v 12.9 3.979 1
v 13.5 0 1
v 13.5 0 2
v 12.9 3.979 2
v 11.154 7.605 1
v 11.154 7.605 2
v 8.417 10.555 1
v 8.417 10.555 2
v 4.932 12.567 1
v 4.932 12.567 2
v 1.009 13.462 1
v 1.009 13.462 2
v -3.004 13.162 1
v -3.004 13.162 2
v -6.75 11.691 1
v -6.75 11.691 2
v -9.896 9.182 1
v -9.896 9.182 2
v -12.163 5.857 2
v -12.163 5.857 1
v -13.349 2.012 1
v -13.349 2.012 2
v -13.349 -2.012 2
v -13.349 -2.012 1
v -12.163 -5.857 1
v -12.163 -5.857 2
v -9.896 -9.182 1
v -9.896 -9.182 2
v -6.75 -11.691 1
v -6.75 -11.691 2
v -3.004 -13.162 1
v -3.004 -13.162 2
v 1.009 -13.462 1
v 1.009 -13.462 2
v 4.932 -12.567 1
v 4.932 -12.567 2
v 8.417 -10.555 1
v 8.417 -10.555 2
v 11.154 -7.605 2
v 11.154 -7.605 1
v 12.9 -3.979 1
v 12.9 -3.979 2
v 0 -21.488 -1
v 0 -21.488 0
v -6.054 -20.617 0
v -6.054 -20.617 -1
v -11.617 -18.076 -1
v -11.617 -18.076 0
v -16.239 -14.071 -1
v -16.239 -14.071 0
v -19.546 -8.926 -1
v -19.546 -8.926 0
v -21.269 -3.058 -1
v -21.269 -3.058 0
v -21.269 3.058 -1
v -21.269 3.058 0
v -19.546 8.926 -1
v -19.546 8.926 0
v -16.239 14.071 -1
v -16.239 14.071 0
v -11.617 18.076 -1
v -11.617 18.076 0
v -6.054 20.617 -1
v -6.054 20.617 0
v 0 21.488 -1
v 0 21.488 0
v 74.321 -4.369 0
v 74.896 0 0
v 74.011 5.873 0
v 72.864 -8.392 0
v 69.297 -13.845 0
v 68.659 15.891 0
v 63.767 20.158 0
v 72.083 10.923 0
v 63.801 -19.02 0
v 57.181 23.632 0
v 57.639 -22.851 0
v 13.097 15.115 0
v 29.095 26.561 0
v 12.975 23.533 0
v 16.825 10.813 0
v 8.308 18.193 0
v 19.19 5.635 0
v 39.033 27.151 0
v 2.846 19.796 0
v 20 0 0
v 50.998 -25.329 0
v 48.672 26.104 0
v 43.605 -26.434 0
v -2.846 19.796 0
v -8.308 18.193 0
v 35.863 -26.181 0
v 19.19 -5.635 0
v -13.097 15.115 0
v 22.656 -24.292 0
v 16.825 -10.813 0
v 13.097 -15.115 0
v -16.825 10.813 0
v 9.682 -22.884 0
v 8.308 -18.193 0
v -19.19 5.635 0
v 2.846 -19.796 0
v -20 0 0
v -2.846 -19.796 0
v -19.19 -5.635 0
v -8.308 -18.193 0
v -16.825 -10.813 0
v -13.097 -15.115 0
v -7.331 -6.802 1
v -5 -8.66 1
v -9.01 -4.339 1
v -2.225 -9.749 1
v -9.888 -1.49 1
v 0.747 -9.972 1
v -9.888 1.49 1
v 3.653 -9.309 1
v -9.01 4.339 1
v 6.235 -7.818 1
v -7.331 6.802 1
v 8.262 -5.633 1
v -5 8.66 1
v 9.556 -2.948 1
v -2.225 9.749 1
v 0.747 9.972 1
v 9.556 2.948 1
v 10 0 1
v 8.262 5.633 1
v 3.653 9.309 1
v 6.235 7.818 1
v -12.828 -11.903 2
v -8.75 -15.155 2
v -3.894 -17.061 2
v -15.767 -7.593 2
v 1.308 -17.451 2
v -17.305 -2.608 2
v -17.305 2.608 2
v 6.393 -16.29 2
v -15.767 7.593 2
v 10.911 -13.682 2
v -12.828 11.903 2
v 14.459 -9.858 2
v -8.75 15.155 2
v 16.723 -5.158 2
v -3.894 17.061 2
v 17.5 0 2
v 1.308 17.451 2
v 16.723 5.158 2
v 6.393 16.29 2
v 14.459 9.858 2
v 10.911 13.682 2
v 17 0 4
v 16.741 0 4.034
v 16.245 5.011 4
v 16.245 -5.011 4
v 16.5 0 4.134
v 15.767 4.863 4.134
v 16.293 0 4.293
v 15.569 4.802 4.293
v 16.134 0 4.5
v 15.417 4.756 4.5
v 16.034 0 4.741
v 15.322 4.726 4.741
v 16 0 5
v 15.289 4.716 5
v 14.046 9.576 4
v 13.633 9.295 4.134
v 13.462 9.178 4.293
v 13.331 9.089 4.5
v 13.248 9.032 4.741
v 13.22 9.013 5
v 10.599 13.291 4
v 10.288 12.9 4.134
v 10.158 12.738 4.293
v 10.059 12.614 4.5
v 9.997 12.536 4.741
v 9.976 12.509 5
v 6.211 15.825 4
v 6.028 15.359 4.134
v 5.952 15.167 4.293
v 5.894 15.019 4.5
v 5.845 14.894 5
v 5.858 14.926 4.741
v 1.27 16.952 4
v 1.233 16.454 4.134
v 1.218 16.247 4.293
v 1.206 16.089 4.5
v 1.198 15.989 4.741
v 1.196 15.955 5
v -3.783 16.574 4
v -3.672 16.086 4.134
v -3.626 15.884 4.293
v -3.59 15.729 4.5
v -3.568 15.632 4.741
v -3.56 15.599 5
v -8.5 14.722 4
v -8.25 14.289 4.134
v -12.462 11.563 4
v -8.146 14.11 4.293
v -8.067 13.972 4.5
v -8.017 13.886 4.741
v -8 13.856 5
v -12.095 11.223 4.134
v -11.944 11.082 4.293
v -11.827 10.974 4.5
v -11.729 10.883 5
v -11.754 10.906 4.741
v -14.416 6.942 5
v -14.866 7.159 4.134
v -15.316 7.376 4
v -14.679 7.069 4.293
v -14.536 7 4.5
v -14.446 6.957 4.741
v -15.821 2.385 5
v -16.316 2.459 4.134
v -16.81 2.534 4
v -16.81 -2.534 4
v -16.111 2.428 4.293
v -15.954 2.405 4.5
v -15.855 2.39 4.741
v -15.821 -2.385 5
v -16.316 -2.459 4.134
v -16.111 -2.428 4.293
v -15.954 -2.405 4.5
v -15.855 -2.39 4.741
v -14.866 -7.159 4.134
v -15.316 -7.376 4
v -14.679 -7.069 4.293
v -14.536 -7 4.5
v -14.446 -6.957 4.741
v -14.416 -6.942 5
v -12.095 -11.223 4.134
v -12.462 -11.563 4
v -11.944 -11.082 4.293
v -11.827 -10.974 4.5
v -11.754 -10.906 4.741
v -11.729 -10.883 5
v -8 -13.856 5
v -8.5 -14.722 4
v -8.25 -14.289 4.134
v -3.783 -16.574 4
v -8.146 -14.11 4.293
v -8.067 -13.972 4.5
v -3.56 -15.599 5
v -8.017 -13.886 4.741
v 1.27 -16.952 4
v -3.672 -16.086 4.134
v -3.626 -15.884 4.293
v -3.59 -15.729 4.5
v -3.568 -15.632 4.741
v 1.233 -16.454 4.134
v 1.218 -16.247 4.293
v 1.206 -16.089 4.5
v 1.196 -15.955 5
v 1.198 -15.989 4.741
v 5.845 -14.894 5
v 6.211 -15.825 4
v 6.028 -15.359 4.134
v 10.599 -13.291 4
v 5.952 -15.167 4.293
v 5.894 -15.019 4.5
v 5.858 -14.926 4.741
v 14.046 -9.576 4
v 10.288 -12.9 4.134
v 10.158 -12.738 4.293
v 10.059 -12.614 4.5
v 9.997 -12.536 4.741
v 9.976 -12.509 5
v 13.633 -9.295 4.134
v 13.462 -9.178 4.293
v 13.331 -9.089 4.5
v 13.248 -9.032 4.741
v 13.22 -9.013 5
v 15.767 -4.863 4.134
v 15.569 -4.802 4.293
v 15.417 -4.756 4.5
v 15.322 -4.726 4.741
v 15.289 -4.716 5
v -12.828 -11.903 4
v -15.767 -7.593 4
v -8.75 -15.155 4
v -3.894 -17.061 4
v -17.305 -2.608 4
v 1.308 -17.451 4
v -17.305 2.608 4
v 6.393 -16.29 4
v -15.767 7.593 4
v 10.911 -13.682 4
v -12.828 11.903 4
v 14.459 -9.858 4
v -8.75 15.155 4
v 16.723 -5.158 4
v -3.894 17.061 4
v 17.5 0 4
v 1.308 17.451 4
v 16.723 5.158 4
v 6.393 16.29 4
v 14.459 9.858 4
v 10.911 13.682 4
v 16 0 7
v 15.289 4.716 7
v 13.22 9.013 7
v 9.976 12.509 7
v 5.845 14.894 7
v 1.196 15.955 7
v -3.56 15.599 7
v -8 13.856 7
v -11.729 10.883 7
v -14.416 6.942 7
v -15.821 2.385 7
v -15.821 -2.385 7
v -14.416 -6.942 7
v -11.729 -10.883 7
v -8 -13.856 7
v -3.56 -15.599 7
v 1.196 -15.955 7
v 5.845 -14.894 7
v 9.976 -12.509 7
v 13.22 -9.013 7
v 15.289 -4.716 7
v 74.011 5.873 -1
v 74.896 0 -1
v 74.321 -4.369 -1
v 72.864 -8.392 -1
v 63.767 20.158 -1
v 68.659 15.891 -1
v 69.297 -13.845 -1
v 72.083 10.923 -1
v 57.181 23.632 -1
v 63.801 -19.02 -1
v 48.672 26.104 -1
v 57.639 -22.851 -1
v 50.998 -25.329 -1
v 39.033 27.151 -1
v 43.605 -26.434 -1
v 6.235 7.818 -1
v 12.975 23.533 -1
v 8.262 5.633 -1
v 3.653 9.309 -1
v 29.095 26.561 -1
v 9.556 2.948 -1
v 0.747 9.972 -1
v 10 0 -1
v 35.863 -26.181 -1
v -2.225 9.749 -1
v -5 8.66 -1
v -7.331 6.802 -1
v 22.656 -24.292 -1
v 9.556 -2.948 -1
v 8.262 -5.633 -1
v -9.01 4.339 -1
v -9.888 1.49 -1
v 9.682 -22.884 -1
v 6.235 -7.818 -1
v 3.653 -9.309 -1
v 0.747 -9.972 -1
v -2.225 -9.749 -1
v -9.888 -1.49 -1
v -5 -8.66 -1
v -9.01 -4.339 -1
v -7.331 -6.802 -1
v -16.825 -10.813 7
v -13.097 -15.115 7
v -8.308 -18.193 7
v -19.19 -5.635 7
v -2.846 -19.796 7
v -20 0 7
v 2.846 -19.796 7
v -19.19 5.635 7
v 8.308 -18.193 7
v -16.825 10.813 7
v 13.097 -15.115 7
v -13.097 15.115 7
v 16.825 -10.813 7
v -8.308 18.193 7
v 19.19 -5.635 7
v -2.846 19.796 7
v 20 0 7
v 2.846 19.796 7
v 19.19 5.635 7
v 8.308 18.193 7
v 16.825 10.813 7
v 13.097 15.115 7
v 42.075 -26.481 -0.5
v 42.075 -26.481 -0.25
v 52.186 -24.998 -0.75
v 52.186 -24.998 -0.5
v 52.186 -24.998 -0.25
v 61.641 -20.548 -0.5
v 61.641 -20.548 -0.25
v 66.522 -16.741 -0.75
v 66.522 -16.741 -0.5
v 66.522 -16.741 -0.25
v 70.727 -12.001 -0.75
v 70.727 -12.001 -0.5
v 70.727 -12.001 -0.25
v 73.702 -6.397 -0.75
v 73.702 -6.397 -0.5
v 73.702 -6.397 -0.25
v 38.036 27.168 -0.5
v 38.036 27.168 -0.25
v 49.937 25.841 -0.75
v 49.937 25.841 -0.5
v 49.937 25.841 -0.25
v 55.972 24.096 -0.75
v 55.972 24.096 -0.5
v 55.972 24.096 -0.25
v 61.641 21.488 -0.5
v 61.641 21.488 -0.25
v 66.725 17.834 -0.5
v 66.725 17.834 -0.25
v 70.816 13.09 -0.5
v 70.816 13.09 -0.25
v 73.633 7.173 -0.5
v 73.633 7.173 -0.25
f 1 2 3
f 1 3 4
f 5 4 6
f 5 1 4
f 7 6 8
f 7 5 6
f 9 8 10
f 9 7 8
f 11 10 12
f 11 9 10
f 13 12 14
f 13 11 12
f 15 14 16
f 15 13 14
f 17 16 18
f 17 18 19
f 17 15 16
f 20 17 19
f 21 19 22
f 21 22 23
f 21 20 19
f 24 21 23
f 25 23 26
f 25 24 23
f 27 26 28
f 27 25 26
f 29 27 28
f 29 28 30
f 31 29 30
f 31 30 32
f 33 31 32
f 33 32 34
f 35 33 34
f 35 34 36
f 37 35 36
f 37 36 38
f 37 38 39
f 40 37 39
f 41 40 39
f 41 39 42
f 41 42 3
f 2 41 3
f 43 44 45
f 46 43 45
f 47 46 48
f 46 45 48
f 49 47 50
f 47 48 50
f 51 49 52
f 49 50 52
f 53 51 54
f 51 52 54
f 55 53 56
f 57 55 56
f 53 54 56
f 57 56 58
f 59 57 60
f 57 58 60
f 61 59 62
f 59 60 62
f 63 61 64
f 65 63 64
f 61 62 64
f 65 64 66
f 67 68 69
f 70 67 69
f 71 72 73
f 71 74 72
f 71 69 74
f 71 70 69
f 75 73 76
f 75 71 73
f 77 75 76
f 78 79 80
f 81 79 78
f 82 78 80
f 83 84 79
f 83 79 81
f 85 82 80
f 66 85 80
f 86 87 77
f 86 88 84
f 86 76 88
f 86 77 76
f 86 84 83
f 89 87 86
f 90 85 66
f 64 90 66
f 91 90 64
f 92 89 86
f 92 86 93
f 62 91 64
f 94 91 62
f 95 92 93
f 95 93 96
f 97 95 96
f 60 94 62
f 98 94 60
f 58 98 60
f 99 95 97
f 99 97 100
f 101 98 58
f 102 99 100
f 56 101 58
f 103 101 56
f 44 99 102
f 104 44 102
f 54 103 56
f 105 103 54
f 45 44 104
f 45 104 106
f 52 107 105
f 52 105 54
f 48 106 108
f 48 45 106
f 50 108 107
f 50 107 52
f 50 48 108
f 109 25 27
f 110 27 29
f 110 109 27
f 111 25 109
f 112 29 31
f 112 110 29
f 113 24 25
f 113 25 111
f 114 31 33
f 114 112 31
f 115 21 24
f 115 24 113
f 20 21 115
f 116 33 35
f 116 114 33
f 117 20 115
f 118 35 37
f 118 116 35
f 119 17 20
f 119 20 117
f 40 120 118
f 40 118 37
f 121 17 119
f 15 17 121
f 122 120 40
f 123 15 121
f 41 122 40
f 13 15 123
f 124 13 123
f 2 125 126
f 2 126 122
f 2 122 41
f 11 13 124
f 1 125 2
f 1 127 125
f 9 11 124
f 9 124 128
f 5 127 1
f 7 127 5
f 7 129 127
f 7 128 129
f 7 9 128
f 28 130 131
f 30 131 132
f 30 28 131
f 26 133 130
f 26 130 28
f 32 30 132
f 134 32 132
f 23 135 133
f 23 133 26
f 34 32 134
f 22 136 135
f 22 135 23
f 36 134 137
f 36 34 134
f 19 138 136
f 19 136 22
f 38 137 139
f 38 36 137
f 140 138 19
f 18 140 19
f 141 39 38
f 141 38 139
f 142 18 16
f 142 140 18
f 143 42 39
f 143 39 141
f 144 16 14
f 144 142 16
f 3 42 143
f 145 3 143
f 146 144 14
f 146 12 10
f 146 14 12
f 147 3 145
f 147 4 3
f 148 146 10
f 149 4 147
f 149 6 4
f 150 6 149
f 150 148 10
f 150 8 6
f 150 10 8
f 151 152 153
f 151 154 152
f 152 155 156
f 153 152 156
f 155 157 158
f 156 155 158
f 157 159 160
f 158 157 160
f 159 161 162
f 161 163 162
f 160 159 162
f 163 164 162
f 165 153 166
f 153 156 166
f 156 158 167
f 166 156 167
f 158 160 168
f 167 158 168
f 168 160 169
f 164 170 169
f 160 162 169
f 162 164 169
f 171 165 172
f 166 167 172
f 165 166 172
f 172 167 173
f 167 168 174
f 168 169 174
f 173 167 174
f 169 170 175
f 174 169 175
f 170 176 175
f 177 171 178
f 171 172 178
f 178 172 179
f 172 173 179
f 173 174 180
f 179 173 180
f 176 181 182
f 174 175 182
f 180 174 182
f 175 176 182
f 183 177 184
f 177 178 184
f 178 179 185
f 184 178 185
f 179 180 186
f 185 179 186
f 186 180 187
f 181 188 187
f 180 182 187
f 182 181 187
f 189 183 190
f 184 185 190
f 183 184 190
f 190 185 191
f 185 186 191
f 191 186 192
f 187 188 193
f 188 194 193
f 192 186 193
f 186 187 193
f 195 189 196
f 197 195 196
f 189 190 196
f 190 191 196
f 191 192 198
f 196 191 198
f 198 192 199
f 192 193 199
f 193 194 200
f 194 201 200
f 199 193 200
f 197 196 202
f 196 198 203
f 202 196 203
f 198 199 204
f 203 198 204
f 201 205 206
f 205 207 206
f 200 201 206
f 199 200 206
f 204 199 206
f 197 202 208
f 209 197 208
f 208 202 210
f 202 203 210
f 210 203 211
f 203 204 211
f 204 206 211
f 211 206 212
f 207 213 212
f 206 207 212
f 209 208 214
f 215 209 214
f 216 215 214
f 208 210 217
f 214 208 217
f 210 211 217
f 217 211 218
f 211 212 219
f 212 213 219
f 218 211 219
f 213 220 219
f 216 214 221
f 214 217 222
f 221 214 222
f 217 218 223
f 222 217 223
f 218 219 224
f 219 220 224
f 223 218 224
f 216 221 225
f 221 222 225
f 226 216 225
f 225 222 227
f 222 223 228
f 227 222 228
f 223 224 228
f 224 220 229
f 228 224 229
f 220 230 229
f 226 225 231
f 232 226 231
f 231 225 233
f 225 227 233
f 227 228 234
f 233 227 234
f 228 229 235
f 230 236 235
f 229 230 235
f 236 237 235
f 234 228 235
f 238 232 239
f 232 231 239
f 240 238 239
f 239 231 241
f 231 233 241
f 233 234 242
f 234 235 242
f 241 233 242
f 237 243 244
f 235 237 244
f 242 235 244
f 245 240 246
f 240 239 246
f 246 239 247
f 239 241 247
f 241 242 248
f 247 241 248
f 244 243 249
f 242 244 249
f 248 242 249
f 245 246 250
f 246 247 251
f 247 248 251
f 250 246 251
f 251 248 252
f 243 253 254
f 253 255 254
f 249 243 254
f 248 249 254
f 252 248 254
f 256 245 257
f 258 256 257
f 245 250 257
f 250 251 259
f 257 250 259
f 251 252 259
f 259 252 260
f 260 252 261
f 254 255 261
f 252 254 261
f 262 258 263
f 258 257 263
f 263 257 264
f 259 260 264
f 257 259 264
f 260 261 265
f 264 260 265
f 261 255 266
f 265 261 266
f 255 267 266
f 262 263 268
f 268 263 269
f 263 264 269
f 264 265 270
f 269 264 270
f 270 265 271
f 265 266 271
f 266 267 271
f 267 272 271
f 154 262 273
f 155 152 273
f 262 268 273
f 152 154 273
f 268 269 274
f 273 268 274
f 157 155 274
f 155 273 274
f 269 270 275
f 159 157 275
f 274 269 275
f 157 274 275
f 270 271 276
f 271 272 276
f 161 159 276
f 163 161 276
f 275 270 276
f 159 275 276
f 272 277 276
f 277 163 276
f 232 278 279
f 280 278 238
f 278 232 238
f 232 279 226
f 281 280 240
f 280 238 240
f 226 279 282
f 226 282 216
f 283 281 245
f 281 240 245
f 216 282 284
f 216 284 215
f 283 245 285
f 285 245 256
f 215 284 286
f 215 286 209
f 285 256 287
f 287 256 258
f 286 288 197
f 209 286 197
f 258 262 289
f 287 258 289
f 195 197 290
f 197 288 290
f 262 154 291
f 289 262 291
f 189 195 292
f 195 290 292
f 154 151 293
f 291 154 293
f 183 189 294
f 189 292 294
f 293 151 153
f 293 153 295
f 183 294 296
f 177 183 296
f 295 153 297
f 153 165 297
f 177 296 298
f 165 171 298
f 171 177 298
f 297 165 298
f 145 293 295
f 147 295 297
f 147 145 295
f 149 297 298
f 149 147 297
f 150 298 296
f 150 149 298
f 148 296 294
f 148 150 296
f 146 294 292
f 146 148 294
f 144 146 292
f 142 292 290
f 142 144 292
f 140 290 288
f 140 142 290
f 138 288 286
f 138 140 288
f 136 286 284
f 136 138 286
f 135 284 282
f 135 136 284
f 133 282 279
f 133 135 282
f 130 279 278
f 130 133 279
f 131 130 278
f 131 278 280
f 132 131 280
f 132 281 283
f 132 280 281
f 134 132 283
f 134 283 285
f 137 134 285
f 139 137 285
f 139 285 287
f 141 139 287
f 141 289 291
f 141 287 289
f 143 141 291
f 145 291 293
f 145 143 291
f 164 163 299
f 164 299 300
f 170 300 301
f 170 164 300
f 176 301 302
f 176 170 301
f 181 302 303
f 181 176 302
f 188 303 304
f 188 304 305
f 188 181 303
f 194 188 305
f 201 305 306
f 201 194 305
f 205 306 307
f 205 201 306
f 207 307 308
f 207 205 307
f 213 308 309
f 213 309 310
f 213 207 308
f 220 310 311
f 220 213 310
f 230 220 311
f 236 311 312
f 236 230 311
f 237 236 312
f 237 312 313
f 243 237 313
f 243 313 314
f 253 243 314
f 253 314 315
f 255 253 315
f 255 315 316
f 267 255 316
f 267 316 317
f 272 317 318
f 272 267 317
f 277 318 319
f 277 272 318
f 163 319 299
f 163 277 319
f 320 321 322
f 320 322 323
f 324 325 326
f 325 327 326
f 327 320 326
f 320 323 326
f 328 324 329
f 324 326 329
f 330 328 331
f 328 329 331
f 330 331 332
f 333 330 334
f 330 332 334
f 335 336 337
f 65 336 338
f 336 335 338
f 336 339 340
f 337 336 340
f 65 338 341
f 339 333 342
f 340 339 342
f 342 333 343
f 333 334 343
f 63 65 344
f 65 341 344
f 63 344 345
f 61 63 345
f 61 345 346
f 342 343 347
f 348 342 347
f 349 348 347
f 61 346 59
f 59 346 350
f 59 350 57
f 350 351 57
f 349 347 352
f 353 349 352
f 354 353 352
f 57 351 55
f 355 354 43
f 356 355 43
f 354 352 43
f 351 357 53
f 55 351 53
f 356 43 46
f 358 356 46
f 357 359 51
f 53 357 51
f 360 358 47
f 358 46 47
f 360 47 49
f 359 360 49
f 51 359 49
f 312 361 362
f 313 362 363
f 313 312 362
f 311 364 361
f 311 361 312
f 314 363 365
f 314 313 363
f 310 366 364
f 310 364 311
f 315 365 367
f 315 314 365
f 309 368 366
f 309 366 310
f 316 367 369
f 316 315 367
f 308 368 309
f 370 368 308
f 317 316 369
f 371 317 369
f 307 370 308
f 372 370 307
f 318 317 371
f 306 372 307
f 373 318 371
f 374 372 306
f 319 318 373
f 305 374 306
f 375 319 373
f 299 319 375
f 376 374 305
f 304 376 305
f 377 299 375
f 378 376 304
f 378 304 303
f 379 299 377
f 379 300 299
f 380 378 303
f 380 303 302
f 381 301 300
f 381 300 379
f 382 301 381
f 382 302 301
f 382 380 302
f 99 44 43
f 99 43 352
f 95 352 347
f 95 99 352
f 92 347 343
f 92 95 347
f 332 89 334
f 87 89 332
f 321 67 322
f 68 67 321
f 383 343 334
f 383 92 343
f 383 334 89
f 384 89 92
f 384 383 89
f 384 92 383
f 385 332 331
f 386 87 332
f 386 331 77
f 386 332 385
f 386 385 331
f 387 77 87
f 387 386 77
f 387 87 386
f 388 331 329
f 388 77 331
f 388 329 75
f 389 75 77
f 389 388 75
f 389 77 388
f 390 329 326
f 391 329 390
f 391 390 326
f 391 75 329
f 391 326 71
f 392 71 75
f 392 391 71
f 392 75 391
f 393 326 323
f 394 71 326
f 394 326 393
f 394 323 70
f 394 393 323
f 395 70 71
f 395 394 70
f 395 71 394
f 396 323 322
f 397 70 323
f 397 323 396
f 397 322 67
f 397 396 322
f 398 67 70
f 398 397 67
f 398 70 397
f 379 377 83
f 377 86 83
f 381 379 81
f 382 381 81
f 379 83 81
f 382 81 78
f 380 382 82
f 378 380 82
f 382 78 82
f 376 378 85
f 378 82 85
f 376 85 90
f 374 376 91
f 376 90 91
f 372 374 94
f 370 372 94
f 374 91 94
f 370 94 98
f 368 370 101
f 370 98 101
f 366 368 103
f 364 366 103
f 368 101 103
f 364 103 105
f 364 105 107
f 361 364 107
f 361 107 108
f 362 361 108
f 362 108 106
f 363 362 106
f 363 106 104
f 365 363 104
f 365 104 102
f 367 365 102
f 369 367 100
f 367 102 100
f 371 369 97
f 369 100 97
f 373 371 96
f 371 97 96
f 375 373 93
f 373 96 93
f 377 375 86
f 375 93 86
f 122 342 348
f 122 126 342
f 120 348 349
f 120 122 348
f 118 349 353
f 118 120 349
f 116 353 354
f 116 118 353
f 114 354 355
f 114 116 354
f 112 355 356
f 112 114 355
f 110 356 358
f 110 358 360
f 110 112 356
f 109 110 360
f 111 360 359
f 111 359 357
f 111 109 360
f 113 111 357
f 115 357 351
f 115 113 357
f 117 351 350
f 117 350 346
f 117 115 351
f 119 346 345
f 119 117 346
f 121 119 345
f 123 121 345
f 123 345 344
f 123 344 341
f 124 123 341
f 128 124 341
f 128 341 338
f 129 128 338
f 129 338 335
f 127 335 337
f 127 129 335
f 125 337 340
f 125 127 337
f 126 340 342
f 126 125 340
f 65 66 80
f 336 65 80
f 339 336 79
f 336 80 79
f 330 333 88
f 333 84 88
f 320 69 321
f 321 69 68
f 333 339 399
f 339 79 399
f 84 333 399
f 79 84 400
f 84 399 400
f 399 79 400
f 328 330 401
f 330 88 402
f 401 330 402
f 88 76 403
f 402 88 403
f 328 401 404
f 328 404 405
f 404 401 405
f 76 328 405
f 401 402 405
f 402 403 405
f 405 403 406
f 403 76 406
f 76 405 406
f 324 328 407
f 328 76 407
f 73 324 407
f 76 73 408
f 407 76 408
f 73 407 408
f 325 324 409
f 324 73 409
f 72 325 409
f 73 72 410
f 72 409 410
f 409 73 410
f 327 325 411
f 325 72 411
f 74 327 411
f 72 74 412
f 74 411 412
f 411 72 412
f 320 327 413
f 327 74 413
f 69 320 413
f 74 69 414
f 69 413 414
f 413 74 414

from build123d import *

# Parameters (mm, degrees)
F0_R     = 13.5
F0_R_2   = 10
F1_DEPTH = 1
F0_R_3   = 17.5
F2_DEPTH = 2
F0_R_4   = 20
F3_DEPTH = 7
F5_START = 4
F4_R     = 20
F4_R_2   = 16
F5_DEPTH = 3
F6_R     = 1
F7_R     = 10
F8_DEPTH = 1


with BuildPart() as f1:
    # F0 (on Top) → F1 (new body)
    with BuildSketch(Plane.XY):
        Circle(F0_R)
        Circle(F0_R_2, mode=Mode.SUBTRACT)
    extrude(amount=F1_DEPTH)

    # F0 (on Top) → F2 (join)
    with BuildSketch(Plane.XY):
        Circle(F0_R_3)
        Circle(F0_R, mode=Mode.SUBTRACT)
    extrude(amount=F2_DEPTH)

    # F0 (on Top) → F3 (join)
    with BuildSketch(Plane.XY):
        Circle(F0_R_4)
        Circle(F0_R_3, mode=Mode.SUBTRACT)
    extrude(amount=F3_DEPTH)

    # F4 (on Top) → F5 (join)
    with BuildSketch(Plane.XY.offset(F5_START)):
        Circle(F4_R)
        Circle(F4_R_2, mode=Mode.SUBTRACT)
    extrude(amount=F5_DEPTH)

    # F6
    f6_edges = [f1.edges().sort_by_distance(p)[0] for p in [
        (-16, 0, 4),
    ]]
    fillet(f6_edges, radius=F6_R)

    # F7 (on face) → F8 (join)
    with BuildSketch(Plane(origin=(0, 0, 0), x_dir=(1, 0, 0), z_dir=(0, 0, -1))):
        with BuildLine():
            add(Edge.make_bspline(
                [(0, 21.4875730586), (6.7657779426, 22.9365033035), (19.1072018799, 23.0482109616), (42.3023448655, 28.3031387355), (62.5173056226, 22.6182888102), (74.7384138035, 9.0261408273), (74.8955963135, 0)],
                knots=[0, 0, 0, 0, 0.2365573131, 0.4928095835, 0.735068508, 1, 1, 1, 1], degree=3))
            ThreePointArc((0, 21.4875730586), (-21.4875730586, 0), (0, -21.4875730586))
            add(Edge.make_bspline(
                [(0, -21.4875730586), (6.5654981556, -22.184182424), (20.8345654653, -25.1367847277), (37.794885628, -28.3962922072), (63.6423801672, -24.0427135063), (74.3739329381, -10.4370014279), (74.8955963135, 0)],
                knots=[0, 0, 0, 0, 0.2436300342, 0.4682692375, 0.7315377861, 1, 1, 1, 1], degree=3))
        make_face()
        Circle(F7_R, mode=Mode.SUBTRACT)
    extrude(amount=F8_DEPTH)


solid = f1.part
